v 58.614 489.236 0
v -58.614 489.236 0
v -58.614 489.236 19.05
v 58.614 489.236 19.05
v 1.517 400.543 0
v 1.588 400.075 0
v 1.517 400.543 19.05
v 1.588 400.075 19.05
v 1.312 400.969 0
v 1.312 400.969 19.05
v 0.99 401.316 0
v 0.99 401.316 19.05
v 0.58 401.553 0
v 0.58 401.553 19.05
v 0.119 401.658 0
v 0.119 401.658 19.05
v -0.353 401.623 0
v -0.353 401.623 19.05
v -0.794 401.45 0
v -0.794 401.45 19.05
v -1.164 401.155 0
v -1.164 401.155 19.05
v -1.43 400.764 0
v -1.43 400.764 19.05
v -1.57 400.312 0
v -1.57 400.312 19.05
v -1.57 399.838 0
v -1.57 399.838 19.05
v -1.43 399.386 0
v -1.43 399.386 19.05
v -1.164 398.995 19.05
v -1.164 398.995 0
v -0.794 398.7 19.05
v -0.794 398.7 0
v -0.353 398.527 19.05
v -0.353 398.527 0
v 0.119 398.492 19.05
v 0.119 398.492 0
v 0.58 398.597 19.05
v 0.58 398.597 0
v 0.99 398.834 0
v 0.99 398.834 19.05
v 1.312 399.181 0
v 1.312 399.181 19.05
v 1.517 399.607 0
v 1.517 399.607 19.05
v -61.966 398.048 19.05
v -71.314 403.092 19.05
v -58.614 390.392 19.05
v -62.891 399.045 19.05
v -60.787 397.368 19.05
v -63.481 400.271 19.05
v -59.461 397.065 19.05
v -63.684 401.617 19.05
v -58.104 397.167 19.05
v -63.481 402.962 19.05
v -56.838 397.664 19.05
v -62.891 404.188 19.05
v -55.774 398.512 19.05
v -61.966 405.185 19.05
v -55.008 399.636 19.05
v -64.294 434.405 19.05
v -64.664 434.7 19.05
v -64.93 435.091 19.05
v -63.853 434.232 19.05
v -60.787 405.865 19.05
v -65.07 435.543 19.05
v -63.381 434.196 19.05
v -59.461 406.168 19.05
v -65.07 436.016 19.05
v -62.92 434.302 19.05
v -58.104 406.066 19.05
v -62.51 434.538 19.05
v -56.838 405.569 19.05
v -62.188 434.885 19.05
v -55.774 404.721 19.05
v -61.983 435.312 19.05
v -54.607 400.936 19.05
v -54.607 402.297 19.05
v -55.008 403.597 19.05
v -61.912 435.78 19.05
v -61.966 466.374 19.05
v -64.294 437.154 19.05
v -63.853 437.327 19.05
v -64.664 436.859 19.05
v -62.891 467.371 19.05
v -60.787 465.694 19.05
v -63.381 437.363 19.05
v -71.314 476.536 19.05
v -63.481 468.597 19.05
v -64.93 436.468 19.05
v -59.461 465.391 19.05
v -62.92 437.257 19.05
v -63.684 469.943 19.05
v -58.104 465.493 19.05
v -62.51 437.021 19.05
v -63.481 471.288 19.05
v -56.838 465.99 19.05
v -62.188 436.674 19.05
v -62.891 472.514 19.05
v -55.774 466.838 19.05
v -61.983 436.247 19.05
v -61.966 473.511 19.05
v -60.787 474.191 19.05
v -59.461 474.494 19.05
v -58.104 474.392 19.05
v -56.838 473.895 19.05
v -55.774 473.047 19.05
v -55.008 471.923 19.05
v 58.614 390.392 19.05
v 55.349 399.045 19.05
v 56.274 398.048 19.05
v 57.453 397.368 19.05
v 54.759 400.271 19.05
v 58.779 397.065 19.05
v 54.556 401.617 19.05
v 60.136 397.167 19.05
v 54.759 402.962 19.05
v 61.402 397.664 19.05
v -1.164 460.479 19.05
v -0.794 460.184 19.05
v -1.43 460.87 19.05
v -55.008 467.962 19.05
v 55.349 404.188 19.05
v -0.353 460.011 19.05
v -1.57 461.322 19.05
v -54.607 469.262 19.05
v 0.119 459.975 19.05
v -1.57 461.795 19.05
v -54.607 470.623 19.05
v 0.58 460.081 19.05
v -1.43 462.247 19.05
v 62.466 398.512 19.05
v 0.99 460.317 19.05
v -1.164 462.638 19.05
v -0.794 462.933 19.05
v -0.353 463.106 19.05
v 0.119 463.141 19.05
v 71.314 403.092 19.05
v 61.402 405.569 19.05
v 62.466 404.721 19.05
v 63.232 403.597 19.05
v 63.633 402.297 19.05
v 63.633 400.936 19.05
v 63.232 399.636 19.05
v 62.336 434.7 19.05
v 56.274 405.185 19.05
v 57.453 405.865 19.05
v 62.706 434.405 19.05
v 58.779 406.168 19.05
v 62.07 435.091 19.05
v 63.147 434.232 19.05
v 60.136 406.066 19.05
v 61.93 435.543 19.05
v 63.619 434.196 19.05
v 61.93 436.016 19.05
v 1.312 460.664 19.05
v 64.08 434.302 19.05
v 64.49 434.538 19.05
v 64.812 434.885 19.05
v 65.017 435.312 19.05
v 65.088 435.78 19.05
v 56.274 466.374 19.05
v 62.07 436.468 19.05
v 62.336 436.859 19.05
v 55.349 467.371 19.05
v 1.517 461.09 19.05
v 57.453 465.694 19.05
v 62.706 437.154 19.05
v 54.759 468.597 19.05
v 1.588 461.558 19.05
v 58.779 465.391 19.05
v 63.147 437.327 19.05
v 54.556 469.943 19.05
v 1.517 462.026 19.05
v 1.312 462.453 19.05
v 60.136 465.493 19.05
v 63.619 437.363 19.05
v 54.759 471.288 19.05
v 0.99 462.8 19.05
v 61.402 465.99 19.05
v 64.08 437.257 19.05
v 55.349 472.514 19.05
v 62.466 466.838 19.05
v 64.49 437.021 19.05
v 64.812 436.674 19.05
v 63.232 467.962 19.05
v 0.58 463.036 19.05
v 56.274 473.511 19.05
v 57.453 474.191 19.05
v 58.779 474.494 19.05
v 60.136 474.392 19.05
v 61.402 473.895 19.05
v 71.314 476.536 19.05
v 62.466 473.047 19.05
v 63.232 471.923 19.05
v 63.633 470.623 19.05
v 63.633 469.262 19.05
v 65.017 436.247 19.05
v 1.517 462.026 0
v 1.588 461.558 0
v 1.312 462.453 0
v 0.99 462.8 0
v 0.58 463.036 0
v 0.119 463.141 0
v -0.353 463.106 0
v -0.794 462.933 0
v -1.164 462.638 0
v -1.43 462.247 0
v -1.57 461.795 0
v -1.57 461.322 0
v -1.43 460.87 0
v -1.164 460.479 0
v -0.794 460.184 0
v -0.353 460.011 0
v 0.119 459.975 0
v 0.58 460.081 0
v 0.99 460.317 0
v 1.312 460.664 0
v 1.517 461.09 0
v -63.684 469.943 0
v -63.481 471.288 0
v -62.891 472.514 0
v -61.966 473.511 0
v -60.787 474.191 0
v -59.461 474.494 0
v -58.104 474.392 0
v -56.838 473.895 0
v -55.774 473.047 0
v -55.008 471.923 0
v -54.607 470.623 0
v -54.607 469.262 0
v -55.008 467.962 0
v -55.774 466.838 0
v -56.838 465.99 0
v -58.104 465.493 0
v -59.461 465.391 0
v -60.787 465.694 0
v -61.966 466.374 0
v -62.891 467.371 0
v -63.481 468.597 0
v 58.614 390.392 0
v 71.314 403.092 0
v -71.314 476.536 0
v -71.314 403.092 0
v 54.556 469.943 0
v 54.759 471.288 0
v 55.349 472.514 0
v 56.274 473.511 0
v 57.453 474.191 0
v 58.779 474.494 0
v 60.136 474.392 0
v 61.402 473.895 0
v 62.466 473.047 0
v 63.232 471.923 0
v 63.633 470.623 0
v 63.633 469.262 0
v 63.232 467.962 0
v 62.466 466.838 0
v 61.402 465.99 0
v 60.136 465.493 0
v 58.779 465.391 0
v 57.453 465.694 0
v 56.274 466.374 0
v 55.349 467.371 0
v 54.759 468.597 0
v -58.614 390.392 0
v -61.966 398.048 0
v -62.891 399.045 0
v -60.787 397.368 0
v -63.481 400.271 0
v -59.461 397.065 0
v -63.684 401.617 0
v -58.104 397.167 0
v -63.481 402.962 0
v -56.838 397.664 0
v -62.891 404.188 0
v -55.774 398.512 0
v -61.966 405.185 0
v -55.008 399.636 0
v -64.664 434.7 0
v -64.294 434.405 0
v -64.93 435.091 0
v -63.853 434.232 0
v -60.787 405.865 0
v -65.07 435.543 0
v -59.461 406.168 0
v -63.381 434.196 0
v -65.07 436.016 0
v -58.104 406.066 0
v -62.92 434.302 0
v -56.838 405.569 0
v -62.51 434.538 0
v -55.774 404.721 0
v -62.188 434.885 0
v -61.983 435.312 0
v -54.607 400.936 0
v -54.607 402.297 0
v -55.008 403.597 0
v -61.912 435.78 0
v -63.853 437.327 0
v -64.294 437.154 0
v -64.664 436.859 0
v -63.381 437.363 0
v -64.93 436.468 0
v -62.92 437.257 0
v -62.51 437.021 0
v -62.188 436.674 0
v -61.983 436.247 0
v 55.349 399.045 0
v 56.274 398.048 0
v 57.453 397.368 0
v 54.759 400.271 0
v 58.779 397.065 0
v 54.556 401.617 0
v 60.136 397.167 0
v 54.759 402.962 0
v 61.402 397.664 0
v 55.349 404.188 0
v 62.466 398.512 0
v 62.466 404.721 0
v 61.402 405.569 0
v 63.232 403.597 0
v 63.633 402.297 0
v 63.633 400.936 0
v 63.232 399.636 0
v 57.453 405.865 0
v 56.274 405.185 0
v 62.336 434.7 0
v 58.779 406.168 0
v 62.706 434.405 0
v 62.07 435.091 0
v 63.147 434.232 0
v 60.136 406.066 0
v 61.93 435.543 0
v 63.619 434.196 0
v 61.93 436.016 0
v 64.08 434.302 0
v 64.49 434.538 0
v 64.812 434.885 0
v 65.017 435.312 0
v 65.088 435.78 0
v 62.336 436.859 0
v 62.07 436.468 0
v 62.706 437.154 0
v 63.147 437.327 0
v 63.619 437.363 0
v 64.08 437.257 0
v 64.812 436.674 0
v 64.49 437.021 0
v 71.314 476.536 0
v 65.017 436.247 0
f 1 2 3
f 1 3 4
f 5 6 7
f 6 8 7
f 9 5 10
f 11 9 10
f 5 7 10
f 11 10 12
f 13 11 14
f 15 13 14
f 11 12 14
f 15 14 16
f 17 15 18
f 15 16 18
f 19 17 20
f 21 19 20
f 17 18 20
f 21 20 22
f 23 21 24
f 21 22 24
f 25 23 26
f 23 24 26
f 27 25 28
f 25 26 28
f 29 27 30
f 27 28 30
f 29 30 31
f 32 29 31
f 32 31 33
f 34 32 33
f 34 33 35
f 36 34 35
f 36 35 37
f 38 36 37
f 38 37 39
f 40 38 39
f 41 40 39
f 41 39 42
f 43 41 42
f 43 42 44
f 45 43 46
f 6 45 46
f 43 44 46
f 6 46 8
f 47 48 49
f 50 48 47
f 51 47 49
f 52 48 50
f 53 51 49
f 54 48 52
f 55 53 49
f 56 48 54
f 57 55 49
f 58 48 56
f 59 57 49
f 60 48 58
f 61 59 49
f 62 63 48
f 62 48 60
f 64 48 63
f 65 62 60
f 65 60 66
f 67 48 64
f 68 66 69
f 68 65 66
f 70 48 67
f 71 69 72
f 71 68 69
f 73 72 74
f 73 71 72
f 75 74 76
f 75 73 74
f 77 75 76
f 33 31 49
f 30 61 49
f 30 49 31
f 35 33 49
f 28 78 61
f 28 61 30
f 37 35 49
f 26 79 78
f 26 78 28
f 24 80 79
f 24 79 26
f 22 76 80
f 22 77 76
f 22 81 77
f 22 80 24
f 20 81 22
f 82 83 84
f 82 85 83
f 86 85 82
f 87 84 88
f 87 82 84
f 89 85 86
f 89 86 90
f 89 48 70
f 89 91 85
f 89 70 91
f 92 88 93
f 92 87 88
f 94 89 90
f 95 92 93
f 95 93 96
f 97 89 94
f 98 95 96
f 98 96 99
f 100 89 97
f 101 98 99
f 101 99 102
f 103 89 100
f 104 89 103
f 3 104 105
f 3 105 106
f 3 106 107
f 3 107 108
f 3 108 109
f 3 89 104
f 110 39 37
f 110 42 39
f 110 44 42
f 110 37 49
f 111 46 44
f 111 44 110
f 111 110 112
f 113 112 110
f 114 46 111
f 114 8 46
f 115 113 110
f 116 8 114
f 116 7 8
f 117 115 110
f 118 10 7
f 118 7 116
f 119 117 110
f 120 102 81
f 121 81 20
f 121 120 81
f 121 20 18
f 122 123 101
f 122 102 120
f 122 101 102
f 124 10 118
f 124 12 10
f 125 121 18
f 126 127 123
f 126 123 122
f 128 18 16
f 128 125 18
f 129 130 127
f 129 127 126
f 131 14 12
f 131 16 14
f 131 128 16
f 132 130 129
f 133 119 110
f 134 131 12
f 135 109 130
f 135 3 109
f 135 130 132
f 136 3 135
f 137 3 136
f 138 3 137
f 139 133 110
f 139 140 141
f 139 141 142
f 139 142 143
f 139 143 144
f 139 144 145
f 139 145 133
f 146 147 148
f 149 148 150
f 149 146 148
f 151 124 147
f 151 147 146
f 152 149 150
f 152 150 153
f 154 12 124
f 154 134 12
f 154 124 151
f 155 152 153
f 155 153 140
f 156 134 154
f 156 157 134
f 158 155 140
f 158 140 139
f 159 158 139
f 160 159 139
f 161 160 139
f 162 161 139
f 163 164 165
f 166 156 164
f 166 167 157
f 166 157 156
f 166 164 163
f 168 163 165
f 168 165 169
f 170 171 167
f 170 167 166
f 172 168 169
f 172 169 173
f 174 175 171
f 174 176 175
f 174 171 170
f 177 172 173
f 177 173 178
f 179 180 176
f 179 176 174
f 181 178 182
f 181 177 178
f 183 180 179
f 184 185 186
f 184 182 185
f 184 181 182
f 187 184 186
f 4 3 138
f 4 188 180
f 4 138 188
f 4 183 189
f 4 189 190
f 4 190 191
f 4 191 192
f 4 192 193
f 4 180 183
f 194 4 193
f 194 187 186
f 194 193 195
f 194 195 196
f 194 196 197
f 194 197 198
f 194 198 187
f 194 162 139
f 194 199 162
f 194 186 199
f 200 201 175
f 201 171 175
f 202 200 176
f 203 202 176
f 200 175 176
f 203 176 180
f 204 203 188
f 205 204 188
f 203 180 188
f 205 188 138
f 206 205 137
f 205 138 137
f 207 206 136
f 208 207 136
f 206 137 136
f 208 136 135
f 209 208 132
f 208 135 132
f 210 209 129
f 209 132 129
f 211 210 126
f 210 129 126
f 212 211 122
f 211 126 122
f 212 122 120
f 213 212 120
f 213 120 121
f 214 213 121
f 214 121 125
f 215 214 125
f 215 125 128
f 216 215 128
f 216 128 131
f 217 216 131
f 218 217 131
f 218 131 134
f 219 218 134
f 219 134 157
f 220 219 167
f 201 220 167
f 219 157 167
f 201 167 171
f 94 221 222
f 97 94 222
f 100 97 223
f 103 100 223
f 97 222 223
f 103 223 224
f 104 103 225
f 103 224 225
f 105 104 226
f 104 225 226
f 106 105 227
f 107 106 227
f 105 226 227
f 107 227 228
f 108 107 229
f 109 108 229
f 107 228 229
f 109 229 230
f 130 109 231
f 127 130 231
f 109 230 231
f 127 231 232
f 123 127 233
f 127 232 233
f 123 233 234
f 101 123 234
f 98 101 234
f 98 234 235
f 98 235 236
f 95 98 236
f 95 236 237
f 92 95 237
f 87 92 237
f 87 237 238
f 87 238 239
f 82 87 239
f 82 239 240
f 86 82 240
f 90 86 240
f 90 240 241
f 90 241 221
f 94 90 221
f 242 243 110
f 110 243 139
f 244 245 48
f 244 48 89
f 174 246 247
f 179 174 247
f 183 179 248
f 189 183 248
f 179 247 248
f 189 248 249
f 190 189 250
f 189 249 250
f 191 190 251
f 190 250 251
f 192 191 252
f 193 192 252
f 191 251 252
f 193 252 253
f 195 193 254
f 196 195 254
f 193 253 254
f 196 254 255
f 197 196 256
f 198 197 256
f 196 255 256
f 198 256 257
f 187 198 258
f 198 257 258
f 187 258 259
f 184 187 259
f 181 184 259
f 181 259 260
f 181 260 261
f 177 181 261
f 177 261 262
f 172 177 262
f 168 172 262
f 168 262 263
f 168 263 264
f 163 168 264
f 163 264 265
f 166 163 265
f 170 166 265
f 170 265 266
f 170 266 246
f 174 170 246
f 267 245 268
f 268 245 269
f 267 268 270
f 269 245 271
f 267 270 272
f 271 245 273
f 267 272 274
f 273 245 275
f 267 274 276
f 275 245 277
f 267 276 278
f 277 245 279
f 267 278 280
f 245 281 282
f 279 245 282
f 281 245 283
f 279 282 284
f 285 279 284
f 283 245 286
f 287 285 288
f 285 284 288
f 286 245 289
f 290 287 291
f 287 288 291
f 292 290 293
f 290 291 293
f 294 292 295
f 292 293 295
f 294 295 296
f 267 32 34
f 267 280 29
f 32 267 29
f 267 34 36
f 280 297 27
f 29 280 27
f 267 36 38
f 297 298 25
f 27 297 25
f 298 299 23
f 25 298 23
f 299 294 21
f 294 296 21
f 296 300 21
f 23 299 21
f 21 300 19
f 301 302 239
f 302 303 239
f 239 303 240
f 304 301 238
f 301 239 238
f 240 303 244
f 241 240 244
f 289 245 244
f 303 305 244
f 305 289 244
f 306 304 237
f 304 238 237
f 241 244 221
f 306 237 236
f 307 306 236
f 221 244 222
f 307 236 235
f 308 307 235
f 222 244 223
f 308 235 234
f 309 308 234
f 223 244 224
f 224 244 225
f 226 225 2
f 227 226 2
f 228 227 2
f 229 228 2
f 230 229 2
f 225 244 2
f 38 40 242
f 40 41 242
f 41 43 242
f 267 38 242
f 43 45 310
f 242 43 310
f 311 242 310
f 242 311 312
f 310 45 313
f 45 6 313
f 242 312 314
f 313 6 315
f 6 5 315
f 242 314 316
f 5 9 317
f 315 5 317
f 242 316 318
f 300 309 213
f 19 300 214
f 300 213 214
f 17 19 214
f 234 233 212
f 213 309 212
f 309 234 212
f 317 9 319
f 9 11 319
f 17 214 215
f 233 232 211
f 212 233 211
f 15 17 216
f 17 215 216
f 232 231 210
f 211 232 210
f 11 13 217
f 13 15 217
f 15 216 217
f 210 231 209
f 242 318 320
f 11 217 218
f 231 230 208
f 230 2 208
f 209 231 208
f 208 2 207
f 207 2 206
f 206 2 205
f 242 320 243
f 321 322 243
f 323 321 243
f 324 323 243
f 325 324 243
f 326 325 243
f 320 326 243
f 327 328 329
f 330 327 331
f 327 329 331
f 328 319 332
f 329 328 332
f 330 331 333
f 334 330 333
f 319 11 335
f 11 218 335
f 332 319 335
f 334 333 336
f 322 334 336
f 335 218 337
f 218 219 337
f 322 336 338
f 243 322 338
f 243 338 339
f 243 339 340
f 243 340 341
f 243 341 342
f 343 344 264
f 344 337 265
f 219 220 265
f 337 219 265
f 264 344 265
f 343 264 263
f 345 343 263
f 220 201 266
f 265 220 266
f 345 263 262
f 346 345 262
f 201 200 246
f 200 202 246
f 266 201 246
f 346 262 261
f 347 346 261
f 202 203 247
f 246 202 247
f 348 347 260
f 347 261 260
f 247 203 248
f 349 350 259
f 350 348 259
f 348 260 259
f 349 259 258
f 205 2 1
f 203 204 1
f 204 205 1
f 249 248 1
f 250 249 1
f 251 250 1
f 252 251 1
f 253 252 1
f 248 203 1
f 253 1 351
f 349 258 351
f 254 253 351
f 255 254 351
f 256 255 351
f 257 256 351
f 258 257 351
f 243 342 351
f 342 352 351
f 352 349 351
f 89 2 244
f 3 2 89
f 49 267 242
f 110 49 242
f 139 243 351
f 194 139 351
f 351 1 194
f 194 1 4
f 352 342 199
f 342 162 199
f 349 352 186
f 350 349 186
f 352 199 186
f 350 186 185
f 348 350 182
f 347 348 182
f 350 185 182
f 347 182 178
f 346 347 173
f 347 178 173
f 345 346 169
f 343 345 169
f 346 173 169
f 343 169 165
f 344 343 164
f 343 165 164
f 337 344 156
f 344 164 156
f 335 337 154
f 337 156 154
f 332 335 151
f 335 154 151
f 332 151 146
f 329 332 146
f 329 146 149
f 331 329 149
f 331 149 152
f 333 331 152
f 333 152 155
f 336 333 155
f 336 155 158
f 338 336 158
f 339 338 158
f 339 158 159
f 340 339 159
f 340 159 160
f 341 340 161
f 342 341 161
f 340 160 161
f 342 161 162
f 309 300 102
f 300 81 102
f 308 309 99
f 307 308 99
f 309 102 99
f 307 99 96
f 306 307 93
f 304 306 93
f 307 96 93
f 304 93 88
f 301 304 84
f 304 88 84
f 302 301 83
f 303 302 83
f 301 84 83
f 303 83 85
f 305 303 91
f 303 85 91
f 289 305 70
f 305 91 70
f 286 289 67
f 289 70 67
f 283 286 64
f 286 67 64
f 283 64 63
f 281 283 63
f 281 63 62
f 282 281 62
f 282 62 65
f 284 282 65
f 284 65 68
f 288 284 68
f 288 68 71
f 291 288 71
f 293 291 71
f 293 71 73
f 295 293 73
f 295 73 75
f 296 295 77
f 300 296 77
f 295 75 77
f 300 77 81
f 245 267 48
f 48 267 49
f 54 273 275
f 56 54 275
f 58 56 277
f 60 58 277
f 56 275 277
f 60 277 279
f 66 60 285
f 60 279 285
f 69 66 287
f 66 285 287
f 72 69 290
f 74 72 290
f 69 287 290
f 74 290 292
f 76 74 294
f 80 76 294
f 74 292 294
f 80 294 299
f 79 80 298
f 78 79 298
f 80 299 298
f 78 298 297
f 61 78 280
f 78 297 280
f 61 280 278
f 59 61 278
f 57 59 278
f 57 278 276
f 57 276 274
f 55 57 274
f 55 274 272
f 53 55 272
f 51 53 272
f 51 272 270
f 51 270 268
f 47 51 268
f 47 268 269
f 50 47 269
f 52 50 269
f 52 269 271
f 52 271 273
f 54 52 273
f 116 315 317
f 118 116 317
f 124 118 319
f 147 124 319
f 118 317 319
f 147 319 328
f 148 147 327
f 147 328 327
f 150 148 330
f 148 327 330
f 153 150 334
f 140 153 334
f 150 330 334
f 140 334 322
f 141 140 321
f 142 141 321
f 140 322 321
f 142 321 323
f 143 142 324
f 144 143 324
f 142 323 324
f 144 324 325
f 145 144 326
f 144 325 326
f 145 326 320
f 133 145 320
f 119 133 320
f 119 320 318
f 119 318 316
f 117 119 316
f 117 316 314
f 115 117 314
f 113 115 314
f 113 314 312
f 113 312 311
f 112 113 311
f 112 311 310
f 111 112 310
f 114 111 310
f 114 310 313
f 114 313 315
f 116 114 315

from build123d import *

# Parameters (mm, degrees)
SKETCH1_W                        = 142.628975504
SKETCH1_H                        = 98.843650928
BOSS_EXTRUDE1_DEPTH              = 19.05
CHAMFER1_SIZE                    = 12.7
F_23_64_0_35938_DIAMETER_HOLE1_D = 9.128252
HOLE1_D                          = 3.175
HOLE1_DEPTH                      = 44.45
HOLE1_CSINK_D                    = 10.16
HOLE1_CSINK_ANGLE                = 82
HOLE1_TIP                        = 0.953866233


with BuildPart() as part:
    # Sketch1 → Boss-Extrude1 (new body)
    with BuildSketch(Plane.XY):
        with Locations((0, 439.814227158)):
            Rectangle(SKETCH1_W, SKETCH1_H)
    extrude(amount=BOSS_EXTRUDE1_DEPTH)

    # Chamfer1
    chamfer1_edges = [part.edges().sort_by_distance(p)[0] for p in [
        (71.314487752, 390.392401694, 9.525),
        (-71.314487752, 390.392401694, 9.525),
        (-71.314487752, 489.236052622, 9.525),
        (71.314487752, 489.236052622, 9.525),
    ]]
    chamfer(chamfer1_edges, length=CHAMFER1_SIZE)

    # 23/64 (0.35938) Diameter Hole1 (through all)
    with Locations(Plane.XY.offset(19.05)):
        with Locations((-59.12, 469.942526688), (59.12, 469.942526688), (59.12, 401.616526688), (-59.12, 401.616526688)):
            Hole(F_23_64_0_35938_DIAMETER_HOLE1_D / 2)

    # Hole1
    with Locations(Plane(origin=(0, 0, -19.05), x_dir=(-1, 0, 0), z_dir=(0, 0, -1))):
        with Locations((63.5, 435.779526688), (-63.5, 435.779526688), (0, 461.558384256), (0, 400.075074406)):
            CounterSinkHole(HOLE1_D / 2, HOLE1_CSINK_D / 2, depth=HOLE1_DEPTH, counter_sink_angle=HOLE1_CSINK_ANGLE)
            with Locations((0, 0, -(HOLE1_DEPTH + HOLE1_TIP / 2))):  # 118° drill point
                Cone(0, HOLE1_D / 2, HOLE1_TIP, mode=Mode.SUBTRACT)


solid = part.part
